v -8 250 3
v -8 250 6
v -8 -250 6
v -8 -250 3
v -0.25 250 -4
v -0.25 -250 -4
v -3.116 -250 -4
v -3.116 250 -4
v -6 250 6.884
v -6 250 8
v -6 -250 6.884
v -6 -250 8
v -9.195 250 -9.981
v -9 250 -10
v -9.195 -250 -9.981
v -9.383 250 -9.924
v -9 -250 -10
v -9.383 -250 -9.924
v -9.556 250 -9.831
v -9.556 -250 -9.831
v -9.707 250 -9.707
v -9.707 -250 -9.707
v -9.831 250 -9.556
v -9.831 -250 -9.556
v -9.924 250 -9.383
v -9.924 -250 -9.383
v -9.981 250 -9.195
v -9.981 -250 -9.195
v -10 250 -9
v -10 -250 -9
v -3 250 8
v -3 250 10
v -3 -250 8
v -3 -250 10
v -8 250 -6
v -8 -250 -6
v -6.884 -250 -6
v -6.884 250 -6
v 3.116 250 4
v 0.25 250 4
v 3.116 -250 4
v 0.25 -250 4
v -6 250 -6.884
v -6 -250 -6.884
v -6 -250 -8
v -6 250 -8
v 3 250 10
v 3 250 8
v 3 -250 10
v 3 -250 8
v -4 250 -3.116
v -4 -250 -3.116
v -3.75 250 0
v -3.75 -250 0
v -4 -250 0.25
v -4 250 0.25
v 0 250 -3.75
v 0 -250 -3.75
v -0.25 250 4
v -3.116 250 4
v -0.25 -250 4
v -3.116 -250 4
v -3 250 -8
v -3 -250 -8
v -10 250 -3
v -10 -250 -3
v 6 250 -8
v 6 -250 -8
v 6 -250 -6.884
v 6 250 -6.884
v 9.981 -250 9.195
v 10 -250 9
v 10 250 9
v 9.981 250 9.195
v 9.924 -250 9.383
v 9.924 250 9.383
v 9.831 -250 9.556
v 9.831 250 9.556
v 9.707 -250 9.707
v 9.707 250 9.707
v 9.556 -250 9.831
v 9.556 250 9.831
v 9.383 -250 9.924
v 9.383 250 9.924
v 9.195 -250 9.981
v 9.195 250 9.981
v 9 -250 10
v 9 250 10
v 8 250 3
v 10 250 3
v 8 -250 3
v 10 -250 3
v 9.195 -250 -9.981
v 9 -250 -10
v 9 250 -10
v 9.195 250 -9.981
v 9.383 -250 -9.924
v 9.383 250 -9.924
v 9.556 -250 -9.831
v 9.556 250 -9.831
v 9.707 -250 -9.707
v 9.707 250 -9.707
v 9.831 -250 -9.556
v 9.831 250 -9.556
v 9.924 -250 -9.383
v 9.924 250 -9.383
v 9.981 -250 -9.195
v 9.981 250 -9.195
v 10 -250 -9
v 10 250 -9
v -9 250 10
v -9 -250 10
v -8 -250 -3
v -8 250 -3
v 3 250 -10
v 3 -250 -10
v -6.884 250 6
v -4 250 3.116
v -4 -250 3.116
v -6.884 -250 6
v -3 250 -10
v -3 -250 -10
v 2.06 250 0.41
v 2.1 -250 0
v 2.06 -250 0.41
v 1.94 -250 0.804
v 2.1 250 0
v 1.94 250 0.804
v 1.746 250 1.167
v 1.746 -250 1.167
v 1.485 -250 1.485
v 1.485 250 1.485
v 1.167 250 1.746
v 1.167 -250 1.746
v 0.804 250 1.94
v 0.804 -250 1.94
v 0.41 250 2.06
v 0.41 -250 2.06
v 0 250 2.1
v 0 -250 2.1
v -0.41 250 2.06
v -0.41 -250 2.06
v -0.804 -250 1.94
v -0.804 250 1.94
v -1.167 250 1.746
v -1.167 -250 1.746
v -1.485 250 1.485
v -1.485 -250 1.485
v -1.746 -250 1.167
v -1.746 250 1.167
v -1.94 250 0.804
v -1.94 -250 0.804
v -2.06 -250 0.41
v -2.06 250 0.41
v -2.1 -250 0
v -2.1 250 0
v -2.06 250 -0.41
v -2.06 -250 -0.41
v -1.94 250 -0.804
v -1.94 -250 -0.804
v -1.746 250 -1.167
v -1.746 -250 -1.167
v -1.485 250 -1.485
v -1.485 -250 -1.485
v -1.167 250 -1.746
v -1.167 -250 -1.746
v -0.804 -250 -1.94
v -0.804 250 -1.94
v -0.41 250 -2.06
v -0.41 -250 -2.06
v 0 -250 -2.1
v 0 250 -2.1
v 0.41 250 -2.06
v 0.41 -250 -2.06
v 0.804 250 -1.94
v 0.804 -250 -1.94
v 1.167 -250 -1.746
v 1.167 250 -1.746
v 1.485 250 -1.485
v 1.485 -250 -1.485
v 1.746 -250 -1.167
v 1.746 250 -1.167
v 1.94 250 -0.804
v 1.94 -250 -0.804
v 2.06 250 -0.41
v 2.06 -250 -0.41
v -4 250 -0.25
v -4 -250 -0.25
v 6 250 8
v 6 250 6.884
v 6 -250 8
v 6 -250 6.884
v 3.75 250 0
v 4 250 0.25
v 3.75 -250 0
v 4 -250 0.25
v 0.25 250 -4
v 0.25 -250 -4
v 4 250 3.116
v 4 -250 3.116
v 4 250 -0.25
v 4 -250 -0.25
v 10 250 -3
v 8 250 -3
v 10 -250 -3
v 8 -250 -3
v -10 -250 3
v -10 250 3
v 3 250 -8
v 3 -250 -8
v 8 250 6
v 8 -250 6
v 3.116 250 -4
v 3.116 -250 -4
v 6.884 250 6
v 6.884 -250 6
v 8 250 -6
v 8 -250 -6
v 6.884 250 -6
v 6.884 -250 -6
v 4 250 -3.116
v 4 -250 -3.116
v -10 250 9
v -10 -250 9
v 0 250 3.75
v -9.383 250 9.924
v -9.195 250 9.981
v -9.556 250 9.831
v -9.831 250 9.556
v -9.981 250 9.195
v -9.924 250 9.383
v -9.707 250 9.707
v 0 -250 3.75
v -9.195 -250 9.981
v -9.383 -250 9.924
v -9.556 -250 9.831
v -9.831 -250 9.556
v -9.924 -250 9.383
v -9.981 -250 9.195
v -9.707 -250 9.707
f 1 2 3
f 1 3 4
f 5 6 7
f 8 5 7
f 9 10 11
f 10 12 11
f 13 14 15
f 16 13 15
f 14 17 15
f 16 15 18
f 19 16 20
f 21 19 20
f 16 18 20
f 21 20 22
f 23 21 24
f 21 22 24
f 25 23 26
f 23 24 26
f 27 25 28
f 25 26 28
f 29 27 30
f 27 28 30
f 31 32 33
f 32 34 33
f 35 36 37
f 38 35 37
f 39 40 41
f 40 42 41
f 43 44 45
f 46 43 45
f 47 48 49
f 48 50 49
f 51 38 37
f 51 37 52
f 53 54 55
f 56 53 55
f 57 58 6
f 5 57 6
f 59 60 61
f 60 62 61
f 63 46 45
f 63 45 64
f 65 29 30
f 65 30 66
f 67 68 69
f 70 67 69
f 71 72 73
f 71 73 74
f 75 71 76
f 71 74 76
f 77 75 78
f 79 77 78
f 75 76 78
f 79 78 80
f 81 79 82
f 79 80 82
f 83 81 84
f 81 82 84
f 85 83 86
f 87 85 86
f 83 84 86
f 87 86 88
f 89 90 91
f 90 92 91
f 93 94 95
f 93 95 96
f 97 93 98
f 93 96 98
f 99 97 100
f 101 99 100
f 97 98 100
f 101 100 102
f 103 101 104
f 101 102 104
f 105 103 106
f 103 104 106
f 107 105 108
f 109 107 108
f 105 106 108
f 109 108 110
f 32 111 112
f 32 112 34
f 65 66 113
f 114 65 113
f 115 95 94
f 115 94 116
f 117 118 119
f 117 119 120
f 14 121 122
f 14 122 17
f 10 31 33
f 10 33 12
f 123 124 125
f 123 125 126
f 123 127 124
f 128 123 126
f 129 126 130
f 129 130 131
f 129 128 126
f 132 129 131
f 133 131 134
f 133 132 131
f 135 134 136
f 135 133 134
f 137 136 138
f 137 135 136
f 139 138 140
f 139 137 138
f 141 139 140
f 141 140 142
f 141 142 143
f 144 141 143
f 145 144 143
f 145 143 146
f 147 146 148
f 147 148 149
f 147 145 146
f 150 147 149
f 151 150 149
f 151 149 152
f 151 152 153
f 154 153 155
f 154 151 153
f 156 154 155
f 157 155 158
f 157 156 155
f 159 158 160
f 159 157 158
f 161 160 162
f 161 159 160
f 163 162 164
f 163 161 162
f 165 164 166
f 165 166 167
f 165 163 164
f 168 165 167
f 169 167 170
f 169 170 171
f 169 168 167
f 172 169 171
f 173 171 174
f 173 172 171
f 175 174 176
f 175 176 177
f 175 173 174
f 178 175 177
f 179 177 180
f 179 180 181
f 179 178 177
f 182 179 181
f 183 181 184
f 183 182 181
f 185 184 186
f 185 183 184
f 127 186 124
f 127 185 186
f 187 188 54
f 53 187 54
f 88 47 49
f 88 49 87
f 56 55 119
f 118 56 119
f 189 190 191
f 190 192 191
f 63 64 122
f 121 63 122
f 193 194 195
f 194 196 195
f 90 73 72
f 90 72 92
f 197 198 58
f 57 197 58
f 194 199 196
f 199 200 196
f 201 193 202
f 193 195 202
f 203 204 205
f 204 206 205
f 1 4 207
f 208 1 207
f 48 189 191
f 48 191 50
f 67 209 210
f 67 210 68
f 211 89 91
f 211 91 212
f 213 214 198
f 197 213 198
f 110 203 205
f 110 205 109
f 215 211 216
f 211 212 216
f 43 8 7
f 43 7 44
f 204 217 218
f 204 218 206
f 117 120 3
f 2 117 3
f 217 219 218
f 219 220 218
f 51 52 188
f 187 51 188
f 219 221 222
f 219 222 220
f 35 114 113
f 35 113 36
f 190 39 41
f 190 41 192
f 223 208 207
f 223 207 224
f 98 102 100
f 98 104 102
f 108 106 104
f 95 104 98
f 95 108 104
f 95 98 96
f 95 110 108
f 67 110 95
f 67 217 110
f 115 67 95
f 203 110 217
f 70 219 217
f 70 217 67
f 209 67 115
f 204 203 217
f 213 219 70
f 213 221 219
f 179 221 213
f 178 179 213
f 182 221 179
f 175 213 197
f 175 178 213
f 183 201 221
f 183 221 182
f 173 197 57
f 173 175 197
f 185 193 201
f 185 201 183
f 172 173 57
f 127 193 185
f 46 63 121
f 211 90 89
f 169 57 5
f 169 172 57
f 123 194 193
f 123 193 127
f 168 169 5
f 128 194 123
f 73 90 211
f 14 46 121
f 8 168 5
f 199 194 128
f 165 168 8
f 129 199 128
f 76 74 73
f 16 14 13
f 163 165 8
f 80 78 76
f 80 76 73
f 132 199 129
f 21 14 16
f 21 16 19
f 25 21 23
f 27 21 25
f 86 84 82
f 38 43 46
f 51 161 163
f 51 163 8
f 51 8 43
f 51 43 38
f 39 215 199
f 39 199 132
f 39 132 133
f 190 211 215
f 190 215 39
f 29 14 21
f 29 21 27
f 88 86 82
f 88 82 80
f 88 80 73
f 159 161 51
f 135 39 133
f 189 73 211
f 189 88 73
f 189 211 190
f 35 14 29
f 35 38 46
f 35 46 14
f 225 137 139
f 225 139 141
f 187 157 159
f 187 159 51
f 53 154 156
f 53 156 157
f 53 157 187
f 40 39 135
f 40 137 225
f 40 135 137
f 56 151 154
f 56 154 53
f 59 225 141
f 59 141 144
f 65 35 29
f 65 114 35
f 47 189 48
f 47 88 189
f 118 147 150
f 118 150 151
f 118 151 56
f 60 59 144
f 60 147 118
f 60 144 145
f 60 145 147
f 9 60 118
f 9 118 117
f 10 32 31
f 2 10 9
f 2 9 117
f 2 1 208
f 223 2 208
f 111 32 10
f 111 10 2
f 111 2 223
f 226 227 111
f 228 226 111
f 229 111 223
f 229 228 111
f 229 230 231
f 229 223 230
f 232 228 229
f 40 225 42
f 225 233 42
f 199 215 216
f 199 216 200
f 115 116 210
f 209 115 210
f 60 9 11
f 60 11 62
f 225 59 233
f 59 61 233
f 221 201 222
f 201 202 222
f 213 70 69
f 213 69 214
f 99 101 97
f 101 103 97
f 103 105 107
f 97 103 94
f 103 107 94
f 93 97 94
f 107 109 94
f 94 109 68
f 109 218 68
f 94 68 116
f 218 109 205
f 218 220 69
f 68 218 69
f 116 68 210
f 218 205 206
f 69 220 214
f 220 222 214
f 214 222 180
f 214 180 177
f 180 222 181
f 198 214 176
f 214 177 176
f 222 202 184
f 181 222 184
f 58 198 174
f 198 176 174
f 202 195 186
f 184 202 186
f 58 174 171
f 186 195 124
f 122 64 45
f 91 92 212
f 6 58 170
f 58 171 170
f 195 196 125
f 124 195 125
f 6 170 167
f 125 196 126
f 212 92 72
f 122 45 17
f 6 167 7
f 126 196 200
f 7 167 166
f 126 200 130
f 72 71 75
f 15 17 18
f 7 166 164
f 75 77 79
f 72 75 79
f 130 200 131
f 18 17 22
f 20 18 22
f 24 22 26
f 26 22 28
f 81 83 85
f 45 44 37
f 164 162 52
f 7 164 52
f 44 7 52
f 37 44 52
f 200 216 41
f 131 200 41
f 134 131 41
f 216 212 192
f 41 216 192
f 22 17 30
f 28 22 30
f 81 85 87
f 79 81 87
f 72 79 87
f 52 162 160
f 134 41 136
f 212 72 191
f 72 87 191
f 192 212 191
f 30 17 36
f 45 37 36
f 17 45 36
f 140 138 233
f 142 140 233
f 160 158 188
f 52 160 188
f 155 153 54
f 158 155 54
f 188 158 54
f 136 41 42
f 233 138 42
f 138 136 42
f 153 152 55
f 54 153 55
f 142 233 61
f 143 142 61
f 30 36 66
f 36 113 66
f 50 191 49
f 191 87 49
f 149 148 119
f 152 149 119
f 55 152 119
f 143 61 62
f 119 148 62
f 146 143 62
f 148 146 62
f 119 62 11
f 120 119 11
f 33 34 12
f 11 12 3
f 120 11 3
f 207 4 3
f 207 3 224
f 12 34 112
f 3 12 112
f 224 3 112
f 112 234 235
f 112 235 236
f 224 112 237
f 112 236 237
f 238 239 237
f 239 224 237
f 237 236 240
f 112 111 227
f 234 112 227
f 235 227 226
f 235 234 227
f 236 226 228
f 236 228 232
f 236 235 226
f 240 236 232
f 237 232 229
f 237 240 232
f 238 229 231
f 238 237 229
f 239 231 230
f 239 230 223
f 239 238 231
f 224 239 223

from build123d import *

# Parameters (mm, degrees)
SKETCH_R  = 2.1
PAD_DEPTH = 250
FILLET_R  = 1


with BuildPart() as part:
    # Sketch → Pad (new body, symmetric)
    with BuildSketch(Plane.XZ):
        Polygon((-10, 10), (-3, 10), (-3, 8), (-6, 8), (-6, 6.883883), (-3.116117, 4), (-0.25, 4), (0, 3.75), (0.25, 4), (3.116117, 4), (6, 6.883883), (6, 8), (3, 8), (3, 10), (10, 10), (10, 3), (8, 3), (8, 6), (6.883883, 6), (4, 3.116117), (4, 0.25), (3.75, 0), (4, -0.25), (4, -3.116117), (6.883883, -6), (8, -6), (8, -3), (10, -3), (10, -10), (3, -10), (3, -8), (6, -8), (6, -6.883883), (3.116117, -4), (0.25, -4), (0, -3.75), (-0.25, -4), (-3.116117, -4), (-6, -6.883883), (-6, -8), (-3, -8), (-3, -10), (-10, -10), (-10, -3), (-8, -3), (-8, -6), (-6.883883, -6), (-4, -3.116117), (-4, -0.25), (-3.75, 0), (-4, 0.25), (-4, 3.116117), (-6.883883, 6), (-8, 6), (-8, 3), (-10, 3), align=None)
        Circle(SKETCH_R, mode=Mode.SUBTRACT)
    extrude(amount=PAD_DEPTH, both=True)

    # Fillet
    fillet_edges = [part.edges().sort_by_distance(p)[0] for p in [
        (-10, 0, 10),
        (-10, 0, -10),
        (10, 0, 10),
        (10, 0, -10),
    ]]
    fillet(fillet_edges, radius=FILLET_R)


solid = part.part
